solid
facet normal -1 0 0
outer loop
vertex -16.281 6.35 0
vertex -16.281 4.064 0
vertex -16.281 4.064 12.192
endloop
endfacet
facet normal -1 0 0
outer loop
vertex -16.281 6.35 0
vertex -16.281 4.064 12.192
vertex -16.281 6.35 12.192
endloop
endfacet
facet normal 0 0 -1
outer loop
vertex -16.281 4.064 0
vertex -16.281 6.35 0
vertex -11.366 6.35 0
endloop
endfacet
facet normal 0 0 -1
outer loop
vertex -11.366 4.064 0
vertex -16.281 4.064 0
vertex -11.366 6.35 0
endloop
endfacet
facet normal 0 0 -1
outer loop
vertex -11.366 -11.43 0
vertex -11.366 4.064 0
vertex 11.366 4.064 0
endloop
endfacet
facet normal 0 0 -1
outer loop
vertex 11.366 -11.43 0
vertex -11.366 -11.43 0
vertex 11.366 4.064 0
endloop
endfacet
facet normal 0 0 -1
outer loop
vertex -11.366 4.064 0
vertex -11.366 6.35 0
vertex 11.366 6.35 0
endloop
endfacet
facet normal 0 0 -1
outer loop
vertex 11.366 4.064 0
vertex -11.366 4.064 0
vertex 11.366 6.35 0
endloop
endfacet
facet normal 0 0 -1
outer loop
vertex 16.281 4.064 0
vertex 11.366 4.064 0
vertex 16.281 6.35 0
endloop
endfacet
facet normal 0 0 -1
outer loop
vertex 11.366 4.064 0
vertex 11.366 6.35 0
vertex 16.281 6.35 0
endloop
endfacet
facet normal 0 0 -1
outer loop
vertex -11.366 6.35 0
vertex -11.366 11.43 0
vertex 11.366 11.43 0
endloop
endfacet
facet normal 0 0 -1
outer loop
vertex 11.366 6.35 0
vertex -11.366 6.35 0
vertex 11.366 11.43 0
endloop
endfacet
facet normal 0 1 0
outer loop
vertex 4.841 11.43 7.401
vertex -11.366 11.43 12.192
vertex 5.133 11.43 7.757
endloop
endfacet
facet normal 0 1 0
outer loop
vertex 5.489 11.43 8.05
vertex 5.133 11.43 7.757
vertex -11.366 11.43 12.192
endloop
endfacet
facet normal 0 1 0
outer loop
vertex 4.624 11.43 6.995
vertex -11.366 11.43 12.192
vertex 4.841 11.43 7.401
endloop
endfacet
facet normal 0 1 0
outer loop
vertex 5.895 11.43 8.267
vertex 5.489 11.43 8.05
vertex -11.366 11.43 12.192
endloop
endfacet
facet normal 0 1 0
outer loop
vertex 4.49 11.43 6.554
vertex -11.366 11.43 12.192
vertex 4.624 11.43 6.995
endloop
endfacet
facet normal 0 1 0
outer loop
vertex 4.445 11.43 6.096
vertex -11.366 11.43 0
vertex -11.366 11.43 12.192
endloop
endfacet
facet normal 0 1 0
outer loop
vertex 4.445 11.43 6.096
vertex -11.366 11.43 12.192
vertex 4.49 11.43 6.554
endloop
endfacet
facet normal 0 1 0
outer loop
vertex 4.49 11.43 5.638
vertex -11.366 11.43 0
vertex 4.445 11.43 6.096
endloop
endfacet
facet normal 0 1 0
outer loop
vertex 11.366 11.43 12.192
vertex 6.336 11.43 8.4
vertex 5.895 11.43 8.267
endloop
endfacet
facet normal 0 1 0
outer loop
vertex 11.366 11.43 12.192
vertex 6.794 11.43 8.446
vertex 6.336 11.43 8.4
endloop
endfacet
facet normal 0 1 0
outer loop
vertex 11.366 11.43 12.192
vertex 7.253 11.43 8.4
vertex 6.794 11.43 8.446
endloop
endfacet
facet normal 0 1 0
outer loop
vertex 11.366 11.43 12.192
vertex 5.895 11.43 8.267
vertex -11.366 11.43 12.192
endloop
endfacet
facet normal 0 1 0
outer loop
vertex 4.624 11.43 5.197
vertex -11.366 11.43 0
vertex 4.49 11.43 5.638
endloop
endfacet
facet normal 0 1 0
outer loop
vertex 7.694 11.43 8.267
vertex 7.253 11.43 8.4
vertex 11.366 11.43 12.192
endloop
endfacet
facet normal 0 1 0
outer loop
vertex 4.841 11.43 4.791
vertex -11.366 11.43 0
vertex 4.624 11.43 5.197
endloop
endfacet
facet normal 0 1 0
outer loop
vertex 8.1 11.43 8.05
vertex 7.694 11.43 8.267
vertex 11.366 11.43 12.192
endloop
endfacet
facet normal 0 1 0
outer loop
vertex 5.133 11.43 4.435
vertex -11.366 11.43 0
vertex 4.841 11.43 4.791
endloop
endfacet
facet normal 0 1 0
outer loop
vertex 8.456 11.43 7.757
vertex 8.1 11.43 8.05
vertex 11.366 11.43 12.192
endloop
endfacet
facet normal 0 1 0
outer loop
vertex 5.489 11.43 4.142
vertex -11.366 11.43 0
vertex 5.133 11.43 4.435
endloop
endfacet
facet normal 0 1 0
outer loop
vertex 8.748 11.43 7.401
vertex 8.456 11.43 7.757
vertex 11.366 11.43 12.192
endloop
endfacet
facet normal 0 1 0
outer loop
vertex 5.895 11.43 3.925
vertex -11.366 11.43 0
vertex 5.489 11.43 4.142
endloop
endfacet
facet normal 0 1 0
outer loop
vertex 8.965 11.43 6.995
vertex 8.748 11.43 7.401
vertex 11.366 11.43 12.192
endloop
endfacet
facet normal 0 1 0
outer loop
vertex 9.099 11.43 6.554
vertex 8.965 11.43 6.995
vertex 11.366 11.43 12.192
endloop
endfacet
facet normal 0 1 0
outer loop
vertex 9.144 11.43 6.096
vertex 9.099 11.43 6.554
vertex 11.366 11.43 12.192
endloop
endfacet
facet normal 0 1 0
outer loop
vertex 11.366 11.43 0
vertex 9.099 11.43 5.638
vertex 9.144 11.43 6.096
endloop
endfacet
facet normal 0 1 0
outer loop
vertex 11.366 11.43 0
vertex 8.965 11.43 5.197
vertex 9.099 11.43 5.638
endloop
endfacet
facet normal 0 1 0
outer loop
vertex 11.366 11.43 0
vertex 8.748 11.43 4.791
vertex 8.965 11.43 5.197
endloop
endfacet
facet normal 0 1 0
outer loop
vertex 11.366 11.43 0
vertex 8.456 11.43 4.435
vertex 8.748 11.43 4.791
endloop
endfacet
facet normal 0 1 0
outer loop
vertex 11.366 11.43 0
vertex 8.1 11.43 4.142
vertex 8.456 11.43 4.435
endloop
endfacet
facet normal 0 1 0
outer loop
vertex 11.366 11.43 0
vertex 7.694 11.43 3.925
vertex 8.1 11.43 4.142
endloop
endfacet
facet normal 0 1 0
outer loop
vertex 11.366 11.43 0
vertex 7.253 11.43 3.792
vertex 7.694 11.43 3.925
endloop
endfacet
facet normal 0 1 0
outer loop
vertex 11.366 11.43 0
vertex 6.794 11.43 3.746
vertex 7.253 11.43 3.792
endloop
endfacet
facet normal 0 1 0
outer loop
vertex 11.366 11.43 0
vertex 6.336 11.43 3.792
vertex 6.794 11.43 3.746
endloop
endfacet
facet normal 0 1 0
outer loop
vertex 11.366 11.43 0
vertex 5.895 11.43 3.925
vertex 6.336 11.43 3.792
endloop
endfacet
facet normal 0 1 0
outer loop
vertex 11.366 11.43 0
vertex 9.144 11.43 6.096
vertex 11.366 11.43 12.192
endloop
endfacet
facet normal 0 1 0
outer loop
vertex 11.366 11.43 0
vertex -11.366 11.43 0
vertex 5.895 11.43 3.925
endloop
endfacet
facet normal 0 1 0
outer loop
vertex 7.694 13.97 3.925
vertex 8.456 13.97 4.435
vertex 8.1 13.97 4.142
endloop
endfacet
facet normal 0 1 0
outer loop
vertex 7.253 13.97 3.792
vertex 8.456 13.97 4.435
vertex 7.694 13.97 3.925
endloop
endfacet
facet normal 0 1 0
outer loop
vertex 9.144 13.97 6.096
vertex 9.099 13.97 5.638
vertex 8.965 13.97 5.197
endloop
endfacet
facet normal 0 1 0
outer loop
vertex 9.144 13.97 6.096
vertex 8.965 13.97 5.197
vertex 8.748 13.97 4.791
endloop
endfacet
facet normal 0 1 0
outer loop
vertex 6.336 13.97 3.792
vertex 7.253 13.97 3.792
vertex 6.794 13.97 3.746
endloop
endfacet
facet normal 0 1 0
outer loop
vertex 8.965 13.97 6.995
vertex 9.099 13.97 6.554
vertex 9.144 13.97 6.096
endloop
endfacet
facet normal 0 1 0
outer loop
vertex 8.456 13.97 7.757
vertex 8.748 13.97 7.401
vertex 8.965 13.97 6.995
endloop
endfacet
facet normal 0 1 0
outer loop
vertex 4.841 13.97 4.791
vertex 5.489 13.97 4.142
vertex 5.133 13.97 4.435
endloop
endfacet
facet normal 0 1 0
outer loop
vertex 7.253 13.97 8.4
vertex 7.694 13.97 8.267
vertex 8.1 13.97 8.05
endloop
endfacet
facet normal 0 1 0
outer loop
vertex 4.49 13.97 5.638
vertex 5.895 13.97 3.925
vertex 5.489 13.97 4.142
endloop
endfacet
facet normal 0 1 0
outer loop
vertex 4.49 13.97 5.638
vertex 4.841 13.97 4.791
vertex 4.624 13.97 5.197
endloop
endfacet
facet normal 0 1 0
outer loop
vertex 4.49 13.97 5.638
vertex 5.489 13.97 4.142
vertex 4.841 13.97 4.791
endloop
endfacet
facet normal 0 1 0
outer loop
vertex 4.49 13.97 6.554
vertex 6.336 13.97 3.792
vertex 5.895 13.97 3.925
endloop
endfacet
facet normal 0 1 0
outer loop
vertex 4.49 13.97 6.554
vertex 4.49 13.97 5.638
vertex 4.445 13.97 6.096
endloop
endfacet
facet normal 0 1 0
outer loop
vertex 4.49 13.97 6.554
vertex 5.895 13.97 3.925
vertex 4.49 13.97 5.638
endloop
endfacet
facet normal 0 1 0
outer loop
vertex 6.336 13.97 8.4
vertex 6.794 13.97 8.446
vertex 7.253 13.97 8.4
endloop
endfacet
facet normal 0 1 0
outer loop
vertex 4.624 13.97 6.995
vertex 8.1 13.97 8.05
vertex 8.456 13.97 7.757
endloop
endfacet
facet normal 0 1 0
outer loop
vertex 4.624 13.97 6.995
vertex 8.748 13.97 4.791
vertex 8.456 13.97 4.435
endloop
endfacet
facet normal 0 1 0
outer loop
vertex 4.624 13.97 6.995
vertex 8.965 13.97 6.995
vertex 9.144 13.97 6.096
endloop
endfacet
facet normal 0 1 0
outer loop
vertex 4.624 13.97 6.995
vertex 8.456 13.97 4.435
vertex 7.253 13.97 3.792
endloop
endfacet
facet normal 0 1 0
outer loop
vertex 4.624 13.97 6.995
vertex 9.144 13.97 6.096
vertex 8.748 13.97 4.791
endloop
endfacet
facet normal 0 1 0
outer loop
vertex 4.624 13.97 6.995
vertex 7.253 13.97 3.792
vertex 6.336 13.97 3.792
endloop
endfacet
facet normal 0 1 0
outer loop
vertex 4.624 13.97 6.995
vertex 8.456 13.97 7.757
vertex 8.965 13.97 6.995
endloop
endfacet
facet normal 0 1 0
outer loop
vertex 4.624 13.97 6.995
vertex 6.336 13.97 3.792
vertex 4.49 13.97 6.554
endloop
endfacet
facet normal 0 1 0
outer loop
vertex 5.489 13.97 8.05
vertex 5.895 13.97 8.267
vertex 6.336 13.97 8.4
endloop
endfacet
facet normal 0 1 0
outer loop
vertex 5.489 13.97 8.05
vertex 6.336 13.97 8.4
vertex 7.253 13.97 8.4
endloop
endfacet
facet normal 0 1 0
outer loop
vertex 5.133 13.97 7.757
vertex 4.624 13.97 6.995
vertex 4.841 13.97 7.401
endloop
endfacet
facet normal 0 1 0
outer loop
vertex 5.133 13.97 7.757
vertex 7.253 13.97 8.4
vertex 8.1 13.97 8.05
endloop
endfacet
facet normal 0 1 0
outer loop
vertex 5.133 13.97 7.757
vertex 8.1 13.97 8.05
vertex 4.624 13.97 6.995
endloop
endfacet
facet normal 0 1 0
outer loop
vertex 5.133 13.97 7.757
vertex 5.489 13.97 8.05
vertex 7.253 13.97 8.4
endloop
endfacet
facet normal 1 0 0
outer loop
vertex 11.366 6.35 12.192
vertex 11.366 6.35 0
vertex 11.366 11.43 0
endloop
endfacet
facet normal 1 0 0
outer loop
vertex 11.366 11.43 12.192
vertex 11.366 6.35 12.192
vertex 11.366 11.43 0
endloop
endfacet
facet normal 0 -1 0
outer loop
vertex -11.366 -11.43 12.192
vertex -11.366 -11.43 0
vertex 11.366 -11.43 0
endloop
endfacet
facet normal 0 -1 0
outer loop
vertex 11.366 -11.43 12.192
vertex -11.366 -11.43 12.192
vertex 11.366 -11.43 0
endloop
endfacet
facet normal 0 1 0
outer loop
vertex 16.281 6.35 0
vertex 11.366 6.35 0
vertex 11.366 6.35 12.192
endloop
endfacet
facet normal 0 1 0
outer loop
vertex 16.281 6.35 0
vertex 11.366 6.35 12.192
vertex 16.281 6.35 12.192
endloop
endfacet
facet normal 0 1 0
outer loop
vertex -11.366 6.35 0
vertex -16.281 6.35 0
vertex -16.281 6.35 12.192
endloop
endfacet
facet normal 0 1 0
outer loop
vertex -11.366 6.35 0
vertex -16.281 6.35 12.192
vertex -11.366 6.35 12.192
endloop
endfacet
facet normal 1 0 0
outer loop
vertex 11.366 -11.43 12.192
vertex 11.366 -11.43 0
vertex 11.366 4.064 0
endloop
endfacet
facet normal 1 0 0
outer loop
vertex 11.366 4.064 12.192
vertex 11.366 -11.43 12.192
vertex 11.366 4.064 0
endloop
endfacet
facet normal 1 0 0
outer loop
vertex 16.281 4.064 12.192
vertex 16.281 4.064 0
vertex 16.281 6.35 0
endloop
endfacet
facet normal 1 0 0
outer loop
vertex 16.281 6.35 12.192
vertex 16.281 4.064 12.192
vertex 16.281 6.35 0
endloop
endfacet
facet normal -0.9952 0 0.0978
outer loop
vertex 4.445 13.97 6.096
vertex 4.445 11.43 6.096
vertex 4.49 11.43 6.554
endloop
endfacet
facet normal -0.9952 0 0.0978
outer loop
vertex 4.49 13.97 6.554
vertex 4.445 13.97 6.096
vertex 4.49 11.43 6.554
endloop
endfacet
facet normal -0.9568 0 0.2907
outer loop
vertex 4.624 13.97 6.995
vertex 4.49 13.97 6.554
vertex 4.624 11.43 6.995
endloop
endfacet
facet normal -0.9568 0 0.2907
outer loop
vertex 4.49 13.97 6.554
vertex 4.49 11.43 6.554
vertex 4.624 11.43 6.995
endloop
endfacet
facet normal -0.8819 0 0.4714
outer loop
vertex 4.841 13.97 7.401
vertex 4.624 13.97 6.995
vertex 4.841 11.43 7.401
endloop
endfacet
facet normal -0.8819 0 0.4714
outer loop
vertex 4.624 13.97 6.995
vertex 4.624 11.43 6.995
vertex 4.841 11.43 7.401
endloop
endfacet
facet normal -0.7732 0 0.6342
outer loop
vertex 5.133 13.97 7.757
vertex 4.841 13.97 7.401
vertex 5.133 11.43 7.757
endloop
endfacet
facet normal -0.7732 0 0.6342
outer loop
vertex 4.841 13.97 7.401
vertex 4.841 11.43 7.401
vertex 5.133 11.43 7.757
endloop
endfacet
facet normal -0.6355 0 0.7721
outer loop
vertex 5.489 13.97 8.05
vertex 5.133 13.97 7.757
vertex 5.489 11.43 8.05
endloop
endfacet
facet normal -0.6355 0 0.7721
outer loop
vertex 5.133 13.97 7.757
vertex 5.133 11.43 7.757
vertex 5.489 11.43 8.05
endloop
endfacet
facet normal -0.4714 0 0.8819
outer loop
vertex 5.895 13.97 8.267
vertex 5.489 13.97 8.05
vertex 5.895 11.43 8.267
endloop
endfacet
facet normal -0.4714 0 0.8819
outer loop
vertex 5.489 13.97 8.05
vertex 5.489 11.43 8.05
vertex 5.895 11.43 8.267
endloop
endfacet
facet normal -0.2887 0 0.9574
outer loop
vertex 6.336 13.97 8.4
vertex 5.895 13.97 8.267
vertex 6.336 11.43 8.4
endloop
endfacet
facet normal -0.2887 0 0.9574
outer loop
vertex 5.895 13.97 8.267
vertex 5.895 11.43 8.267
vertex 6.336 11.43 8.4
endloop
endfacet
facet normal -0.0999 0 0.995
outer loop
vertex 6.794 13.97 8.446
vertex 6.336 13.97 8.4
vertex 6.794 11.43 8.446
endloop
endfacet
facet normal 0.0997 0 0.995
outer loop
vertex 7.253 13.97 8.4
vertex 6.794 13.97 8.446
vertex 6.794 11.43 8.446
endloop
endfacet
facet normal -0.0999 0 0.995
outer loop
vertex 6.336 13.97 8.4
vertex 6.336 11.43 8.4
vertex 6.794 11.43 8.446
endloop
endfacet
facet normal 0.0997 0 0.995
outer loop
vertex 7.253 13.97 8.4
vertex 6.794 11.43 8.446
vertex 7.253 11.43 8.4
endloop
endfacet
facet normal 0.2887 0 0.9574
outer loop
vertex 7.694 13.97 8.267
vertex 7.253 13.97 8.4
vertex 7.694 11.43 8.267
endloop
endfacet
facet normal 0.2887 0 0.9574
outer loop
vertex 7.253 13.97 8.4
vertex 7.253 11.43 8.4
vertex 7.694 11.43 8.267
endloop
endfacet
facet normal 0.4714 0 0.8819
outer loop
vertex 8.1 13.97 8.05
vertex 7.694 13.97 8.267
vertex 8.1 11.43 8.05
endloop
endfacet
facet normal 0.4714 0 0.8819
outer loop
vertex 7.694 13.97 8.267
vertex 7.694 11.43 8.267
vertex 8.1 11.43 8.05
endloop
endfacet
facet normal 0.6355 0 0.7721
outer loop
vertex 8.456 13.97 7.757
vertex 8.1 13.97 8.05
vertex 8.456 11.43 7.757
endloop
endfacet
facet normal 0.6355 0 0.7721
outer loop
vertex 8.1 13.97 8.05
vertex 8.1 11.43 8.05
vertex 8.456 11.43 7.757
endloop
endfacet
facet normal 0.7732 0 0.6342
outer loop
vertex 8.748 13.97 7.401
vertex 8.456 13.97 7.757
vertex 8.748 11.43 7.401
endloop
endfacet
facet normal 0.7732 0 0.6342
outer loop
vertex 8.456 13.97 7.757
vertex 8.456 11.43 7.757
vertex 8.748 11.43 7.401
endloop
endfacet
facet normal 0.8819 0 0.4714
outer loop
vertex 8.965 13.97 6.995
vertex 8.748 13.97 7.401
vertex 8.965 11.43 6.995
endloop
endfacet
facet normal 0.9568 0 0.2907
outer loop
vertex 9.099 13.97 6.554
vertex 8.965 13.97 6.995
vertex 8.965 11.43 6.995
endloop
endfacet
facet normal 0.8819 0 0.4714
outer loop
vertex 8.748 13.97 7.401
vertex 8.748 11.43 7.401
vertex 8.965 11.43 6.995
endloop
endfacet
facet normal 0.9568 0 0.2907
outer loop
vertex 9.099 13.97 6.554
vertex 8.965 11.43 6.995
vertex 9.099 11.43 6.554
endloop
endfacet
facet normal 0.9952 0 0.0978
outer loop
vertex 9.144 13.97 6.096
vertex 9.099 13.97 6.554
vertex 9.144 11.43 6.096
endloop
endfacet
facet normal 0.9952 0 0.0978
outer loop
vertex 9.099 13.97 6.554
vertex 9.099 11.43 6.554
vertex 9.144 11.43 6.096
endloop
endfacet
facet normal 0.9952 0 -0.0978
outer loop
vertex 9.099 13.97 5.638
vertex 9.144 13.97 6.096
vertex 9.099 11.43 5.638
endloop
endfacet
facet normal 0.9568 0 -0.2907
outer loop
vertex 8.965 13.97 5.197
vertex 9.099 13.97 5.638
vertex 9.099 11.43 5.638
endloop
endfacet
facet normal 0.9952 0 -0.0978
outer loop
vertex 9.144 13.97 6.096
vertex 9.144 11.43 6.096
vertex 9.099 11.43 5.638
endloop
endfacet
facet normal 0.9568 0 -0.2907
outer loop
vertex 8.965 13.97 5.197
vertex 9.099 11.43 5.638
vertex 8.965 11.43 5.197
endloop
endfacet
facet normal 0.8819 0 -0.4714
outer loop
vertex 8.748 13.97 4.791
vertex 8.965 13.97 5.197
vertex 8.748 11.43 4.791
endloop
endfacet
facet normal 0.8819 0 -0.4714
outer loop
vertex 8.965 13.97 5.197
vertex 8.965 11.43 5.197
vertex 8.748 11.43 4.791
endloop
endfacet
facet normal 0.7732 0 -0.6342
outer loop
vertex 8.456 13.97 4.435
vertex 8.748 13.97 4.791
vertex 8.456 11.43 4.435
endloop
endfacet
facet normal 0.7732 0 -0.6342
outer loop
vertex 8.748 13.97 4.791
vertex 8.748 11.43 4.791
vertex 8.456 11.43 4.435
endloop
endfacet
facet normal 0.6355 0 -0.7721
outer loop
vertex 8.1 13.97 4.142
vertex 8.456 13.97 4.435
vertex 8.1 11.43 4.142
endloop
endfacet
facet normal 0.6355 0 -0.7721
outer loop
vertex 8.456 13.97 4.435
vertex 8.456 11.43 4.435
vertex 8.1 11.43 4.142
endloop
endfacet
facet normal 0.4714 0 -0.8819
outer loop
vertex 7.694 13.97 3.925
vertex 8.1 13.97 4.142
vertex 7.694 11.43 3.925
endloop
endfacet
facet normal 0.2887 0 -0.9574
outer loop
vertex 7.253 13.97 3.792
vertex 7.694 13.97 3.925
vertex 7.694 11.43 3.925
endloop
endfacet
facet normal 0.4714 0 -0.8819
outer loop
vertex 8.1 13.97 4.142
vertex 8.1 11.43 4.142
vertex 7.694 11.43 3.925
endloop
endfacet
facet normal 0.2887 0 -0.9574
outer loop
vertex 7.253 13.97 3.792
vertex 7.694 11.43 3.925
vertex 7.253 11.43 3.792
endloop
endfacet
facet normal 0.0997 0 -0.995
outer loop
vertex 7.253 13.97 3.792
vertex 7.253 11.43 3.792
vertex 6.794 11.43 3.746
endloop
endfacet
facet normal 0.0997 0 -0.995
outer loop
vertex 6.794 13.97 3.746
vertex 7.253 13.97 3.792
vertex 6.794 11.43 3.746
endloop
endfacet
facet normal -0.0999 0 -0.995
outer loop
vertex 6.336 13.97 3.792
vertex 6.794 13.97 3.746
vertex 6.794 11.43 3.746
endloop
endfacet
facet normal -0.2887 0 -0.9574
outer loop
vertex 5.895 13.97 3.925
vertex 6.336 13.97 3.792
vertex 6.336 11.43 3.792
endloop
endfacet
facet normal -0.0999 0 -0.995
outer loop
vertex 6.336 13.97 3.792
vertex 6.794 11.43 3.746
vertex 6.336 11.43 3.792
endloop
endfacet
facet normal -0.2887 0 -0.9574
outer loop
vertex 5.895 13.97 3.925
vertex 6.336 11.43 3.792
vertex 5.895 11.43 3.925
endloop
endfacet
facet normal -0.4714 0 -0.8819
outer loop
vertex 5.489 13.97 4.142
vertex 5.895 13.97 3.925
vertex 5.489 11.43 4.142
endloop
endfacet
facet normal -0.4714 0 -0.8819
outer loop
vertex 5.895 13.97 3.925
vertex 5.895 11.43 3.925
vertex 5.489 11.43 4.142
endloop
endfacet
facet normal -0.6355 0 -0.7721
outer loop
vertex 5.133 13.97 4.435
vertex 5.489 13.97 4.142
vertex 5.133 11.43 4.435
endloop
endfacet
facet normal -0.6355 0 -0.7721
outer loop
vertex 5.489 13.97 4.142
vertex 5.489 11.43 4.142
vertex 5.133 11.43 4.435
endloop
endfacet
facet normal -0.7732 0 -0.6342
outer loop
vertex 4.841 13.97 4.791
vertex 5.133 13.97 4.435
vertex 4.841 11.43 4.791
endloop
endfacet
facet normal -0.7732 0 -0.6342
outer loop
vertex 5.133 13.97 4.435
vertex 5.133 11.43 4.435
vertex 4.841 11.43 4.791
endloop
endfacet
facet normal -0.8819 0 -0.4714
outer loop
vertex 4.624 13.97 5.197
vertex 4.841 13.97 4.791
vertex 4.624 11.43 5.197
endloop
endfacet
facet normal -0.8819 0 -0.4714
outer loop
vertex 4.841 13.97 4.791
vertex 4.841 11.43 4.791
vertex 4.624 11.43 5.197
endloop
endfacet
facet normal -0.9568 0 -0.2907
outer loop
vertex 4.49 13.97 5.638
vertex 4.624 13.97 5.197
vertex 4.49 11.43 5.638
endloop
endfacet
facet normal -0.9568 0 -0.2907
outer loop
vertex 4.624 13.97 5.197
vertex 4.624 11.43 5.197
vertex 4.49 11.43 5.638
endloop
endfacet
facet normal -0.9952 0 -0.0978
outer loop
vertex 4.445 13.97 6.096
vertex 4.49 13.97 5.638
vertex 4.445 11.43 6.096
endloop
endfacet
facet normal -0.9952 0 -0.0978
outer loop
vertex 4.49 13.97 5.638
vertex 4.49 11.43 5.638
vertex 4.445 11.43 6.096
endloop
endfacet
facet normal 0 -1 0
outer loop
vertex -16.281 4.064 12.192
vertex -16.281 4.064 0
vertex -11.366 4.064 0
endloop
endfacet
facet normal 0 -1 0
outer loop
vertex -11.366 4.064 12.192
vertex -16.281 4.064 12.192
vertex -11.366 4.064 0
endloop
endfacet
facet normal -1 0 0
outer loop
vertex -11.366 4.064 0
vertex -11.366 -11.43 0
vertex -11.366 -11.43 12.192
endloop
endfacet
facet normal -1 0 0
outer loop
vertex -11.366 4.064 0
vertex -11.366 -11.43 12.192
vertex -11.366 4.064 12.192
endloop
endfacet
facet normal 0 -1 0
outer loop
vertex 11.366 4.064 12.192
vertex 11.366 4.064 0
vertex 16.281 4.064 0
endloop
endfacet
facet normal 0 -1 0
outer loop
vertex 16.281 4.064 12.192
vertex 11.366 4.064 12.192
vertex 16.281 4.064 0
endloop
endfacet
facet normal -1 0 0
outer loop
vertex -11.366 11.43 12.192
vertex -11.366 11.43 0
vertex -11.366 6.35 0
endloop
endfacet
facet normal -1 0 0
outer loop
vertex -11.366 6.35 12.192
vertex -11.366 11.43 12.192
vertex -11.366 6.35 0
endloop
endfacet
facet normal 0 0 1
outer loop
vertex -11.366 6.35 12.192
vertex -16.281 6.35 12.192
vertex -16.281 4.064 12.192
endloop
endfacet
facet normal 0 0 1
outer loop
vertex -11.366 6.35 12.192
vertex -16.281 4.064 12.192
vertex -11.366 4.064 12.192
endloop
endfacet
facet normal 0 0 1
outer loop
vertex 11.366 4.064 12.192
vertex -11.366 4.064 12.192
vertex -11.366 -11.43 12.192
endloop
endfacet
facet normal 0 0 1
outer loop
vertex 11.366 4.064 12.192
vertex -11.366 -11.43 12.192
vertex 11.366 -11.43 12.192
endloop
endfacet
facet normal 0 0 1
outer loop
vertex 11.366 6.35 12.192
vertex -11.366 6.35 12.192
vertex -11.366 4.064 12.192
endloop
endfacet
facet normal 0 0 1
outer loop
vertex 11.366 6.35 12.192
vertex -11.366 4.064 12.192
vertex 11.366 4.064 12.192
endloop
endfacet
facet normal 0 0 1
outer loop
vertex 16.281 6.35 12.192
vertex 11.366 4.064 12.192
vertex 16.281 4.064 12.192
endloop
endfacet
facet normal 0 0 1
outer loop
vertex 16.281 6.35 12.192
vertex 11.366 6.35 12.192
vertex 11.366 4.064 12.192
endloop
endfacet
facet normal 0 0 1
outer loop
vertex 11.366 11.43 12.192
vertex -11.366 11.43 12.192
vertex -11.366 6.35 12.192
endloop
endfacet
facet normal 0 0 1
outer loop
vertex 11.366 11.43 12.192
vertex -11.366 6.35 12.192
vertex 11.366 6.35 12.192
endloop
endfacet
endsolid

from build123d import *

# Parameters (mm, degrees)
F0_W     = 22.733
F0_H     = 5.08
F0_H_2   = 2.286
F0_W_2   = 4.9149
F0_H_3   = 15.494
F1_DEPTH = 12.192
F2_R     = 2.3495
F3_DEPTH = 2.54


with BuildPart() as f1:
    # F0 (on Top) → F1 (new body)
    with BuildSketch(Plane.XY):
        with Locations((0, 8.89)):
            Rectangle(F0_W, F0_H)
        with Locations((0, 5.207)):
            Rectangle(F0_W, F0_H_2)
        with Locations((-13.82395, 5.207)):
            Rectangle(F0_W_2, F0_H_2)
        with Locations((0, -3.683)):
            Rectangle(F0_W, F0_H_3)
        with Locations((13.82395, 5.207)):
            Rectangle(F0_W_2, F0_H_2)
    extrude(amount=F1_DEPTH)

    # F2 (on face) → F3 (join)
    with BuildSketch(Plane(origin=(0, 11.43, 0), x_dir=(-1, 0, 0), z_dir=(0, 1, 0))):
        with Locations((-6.7945, 6.096)):
            Circle(F2_R)
    extrude(amount=F3_DEPTH)


solid = f1.part
